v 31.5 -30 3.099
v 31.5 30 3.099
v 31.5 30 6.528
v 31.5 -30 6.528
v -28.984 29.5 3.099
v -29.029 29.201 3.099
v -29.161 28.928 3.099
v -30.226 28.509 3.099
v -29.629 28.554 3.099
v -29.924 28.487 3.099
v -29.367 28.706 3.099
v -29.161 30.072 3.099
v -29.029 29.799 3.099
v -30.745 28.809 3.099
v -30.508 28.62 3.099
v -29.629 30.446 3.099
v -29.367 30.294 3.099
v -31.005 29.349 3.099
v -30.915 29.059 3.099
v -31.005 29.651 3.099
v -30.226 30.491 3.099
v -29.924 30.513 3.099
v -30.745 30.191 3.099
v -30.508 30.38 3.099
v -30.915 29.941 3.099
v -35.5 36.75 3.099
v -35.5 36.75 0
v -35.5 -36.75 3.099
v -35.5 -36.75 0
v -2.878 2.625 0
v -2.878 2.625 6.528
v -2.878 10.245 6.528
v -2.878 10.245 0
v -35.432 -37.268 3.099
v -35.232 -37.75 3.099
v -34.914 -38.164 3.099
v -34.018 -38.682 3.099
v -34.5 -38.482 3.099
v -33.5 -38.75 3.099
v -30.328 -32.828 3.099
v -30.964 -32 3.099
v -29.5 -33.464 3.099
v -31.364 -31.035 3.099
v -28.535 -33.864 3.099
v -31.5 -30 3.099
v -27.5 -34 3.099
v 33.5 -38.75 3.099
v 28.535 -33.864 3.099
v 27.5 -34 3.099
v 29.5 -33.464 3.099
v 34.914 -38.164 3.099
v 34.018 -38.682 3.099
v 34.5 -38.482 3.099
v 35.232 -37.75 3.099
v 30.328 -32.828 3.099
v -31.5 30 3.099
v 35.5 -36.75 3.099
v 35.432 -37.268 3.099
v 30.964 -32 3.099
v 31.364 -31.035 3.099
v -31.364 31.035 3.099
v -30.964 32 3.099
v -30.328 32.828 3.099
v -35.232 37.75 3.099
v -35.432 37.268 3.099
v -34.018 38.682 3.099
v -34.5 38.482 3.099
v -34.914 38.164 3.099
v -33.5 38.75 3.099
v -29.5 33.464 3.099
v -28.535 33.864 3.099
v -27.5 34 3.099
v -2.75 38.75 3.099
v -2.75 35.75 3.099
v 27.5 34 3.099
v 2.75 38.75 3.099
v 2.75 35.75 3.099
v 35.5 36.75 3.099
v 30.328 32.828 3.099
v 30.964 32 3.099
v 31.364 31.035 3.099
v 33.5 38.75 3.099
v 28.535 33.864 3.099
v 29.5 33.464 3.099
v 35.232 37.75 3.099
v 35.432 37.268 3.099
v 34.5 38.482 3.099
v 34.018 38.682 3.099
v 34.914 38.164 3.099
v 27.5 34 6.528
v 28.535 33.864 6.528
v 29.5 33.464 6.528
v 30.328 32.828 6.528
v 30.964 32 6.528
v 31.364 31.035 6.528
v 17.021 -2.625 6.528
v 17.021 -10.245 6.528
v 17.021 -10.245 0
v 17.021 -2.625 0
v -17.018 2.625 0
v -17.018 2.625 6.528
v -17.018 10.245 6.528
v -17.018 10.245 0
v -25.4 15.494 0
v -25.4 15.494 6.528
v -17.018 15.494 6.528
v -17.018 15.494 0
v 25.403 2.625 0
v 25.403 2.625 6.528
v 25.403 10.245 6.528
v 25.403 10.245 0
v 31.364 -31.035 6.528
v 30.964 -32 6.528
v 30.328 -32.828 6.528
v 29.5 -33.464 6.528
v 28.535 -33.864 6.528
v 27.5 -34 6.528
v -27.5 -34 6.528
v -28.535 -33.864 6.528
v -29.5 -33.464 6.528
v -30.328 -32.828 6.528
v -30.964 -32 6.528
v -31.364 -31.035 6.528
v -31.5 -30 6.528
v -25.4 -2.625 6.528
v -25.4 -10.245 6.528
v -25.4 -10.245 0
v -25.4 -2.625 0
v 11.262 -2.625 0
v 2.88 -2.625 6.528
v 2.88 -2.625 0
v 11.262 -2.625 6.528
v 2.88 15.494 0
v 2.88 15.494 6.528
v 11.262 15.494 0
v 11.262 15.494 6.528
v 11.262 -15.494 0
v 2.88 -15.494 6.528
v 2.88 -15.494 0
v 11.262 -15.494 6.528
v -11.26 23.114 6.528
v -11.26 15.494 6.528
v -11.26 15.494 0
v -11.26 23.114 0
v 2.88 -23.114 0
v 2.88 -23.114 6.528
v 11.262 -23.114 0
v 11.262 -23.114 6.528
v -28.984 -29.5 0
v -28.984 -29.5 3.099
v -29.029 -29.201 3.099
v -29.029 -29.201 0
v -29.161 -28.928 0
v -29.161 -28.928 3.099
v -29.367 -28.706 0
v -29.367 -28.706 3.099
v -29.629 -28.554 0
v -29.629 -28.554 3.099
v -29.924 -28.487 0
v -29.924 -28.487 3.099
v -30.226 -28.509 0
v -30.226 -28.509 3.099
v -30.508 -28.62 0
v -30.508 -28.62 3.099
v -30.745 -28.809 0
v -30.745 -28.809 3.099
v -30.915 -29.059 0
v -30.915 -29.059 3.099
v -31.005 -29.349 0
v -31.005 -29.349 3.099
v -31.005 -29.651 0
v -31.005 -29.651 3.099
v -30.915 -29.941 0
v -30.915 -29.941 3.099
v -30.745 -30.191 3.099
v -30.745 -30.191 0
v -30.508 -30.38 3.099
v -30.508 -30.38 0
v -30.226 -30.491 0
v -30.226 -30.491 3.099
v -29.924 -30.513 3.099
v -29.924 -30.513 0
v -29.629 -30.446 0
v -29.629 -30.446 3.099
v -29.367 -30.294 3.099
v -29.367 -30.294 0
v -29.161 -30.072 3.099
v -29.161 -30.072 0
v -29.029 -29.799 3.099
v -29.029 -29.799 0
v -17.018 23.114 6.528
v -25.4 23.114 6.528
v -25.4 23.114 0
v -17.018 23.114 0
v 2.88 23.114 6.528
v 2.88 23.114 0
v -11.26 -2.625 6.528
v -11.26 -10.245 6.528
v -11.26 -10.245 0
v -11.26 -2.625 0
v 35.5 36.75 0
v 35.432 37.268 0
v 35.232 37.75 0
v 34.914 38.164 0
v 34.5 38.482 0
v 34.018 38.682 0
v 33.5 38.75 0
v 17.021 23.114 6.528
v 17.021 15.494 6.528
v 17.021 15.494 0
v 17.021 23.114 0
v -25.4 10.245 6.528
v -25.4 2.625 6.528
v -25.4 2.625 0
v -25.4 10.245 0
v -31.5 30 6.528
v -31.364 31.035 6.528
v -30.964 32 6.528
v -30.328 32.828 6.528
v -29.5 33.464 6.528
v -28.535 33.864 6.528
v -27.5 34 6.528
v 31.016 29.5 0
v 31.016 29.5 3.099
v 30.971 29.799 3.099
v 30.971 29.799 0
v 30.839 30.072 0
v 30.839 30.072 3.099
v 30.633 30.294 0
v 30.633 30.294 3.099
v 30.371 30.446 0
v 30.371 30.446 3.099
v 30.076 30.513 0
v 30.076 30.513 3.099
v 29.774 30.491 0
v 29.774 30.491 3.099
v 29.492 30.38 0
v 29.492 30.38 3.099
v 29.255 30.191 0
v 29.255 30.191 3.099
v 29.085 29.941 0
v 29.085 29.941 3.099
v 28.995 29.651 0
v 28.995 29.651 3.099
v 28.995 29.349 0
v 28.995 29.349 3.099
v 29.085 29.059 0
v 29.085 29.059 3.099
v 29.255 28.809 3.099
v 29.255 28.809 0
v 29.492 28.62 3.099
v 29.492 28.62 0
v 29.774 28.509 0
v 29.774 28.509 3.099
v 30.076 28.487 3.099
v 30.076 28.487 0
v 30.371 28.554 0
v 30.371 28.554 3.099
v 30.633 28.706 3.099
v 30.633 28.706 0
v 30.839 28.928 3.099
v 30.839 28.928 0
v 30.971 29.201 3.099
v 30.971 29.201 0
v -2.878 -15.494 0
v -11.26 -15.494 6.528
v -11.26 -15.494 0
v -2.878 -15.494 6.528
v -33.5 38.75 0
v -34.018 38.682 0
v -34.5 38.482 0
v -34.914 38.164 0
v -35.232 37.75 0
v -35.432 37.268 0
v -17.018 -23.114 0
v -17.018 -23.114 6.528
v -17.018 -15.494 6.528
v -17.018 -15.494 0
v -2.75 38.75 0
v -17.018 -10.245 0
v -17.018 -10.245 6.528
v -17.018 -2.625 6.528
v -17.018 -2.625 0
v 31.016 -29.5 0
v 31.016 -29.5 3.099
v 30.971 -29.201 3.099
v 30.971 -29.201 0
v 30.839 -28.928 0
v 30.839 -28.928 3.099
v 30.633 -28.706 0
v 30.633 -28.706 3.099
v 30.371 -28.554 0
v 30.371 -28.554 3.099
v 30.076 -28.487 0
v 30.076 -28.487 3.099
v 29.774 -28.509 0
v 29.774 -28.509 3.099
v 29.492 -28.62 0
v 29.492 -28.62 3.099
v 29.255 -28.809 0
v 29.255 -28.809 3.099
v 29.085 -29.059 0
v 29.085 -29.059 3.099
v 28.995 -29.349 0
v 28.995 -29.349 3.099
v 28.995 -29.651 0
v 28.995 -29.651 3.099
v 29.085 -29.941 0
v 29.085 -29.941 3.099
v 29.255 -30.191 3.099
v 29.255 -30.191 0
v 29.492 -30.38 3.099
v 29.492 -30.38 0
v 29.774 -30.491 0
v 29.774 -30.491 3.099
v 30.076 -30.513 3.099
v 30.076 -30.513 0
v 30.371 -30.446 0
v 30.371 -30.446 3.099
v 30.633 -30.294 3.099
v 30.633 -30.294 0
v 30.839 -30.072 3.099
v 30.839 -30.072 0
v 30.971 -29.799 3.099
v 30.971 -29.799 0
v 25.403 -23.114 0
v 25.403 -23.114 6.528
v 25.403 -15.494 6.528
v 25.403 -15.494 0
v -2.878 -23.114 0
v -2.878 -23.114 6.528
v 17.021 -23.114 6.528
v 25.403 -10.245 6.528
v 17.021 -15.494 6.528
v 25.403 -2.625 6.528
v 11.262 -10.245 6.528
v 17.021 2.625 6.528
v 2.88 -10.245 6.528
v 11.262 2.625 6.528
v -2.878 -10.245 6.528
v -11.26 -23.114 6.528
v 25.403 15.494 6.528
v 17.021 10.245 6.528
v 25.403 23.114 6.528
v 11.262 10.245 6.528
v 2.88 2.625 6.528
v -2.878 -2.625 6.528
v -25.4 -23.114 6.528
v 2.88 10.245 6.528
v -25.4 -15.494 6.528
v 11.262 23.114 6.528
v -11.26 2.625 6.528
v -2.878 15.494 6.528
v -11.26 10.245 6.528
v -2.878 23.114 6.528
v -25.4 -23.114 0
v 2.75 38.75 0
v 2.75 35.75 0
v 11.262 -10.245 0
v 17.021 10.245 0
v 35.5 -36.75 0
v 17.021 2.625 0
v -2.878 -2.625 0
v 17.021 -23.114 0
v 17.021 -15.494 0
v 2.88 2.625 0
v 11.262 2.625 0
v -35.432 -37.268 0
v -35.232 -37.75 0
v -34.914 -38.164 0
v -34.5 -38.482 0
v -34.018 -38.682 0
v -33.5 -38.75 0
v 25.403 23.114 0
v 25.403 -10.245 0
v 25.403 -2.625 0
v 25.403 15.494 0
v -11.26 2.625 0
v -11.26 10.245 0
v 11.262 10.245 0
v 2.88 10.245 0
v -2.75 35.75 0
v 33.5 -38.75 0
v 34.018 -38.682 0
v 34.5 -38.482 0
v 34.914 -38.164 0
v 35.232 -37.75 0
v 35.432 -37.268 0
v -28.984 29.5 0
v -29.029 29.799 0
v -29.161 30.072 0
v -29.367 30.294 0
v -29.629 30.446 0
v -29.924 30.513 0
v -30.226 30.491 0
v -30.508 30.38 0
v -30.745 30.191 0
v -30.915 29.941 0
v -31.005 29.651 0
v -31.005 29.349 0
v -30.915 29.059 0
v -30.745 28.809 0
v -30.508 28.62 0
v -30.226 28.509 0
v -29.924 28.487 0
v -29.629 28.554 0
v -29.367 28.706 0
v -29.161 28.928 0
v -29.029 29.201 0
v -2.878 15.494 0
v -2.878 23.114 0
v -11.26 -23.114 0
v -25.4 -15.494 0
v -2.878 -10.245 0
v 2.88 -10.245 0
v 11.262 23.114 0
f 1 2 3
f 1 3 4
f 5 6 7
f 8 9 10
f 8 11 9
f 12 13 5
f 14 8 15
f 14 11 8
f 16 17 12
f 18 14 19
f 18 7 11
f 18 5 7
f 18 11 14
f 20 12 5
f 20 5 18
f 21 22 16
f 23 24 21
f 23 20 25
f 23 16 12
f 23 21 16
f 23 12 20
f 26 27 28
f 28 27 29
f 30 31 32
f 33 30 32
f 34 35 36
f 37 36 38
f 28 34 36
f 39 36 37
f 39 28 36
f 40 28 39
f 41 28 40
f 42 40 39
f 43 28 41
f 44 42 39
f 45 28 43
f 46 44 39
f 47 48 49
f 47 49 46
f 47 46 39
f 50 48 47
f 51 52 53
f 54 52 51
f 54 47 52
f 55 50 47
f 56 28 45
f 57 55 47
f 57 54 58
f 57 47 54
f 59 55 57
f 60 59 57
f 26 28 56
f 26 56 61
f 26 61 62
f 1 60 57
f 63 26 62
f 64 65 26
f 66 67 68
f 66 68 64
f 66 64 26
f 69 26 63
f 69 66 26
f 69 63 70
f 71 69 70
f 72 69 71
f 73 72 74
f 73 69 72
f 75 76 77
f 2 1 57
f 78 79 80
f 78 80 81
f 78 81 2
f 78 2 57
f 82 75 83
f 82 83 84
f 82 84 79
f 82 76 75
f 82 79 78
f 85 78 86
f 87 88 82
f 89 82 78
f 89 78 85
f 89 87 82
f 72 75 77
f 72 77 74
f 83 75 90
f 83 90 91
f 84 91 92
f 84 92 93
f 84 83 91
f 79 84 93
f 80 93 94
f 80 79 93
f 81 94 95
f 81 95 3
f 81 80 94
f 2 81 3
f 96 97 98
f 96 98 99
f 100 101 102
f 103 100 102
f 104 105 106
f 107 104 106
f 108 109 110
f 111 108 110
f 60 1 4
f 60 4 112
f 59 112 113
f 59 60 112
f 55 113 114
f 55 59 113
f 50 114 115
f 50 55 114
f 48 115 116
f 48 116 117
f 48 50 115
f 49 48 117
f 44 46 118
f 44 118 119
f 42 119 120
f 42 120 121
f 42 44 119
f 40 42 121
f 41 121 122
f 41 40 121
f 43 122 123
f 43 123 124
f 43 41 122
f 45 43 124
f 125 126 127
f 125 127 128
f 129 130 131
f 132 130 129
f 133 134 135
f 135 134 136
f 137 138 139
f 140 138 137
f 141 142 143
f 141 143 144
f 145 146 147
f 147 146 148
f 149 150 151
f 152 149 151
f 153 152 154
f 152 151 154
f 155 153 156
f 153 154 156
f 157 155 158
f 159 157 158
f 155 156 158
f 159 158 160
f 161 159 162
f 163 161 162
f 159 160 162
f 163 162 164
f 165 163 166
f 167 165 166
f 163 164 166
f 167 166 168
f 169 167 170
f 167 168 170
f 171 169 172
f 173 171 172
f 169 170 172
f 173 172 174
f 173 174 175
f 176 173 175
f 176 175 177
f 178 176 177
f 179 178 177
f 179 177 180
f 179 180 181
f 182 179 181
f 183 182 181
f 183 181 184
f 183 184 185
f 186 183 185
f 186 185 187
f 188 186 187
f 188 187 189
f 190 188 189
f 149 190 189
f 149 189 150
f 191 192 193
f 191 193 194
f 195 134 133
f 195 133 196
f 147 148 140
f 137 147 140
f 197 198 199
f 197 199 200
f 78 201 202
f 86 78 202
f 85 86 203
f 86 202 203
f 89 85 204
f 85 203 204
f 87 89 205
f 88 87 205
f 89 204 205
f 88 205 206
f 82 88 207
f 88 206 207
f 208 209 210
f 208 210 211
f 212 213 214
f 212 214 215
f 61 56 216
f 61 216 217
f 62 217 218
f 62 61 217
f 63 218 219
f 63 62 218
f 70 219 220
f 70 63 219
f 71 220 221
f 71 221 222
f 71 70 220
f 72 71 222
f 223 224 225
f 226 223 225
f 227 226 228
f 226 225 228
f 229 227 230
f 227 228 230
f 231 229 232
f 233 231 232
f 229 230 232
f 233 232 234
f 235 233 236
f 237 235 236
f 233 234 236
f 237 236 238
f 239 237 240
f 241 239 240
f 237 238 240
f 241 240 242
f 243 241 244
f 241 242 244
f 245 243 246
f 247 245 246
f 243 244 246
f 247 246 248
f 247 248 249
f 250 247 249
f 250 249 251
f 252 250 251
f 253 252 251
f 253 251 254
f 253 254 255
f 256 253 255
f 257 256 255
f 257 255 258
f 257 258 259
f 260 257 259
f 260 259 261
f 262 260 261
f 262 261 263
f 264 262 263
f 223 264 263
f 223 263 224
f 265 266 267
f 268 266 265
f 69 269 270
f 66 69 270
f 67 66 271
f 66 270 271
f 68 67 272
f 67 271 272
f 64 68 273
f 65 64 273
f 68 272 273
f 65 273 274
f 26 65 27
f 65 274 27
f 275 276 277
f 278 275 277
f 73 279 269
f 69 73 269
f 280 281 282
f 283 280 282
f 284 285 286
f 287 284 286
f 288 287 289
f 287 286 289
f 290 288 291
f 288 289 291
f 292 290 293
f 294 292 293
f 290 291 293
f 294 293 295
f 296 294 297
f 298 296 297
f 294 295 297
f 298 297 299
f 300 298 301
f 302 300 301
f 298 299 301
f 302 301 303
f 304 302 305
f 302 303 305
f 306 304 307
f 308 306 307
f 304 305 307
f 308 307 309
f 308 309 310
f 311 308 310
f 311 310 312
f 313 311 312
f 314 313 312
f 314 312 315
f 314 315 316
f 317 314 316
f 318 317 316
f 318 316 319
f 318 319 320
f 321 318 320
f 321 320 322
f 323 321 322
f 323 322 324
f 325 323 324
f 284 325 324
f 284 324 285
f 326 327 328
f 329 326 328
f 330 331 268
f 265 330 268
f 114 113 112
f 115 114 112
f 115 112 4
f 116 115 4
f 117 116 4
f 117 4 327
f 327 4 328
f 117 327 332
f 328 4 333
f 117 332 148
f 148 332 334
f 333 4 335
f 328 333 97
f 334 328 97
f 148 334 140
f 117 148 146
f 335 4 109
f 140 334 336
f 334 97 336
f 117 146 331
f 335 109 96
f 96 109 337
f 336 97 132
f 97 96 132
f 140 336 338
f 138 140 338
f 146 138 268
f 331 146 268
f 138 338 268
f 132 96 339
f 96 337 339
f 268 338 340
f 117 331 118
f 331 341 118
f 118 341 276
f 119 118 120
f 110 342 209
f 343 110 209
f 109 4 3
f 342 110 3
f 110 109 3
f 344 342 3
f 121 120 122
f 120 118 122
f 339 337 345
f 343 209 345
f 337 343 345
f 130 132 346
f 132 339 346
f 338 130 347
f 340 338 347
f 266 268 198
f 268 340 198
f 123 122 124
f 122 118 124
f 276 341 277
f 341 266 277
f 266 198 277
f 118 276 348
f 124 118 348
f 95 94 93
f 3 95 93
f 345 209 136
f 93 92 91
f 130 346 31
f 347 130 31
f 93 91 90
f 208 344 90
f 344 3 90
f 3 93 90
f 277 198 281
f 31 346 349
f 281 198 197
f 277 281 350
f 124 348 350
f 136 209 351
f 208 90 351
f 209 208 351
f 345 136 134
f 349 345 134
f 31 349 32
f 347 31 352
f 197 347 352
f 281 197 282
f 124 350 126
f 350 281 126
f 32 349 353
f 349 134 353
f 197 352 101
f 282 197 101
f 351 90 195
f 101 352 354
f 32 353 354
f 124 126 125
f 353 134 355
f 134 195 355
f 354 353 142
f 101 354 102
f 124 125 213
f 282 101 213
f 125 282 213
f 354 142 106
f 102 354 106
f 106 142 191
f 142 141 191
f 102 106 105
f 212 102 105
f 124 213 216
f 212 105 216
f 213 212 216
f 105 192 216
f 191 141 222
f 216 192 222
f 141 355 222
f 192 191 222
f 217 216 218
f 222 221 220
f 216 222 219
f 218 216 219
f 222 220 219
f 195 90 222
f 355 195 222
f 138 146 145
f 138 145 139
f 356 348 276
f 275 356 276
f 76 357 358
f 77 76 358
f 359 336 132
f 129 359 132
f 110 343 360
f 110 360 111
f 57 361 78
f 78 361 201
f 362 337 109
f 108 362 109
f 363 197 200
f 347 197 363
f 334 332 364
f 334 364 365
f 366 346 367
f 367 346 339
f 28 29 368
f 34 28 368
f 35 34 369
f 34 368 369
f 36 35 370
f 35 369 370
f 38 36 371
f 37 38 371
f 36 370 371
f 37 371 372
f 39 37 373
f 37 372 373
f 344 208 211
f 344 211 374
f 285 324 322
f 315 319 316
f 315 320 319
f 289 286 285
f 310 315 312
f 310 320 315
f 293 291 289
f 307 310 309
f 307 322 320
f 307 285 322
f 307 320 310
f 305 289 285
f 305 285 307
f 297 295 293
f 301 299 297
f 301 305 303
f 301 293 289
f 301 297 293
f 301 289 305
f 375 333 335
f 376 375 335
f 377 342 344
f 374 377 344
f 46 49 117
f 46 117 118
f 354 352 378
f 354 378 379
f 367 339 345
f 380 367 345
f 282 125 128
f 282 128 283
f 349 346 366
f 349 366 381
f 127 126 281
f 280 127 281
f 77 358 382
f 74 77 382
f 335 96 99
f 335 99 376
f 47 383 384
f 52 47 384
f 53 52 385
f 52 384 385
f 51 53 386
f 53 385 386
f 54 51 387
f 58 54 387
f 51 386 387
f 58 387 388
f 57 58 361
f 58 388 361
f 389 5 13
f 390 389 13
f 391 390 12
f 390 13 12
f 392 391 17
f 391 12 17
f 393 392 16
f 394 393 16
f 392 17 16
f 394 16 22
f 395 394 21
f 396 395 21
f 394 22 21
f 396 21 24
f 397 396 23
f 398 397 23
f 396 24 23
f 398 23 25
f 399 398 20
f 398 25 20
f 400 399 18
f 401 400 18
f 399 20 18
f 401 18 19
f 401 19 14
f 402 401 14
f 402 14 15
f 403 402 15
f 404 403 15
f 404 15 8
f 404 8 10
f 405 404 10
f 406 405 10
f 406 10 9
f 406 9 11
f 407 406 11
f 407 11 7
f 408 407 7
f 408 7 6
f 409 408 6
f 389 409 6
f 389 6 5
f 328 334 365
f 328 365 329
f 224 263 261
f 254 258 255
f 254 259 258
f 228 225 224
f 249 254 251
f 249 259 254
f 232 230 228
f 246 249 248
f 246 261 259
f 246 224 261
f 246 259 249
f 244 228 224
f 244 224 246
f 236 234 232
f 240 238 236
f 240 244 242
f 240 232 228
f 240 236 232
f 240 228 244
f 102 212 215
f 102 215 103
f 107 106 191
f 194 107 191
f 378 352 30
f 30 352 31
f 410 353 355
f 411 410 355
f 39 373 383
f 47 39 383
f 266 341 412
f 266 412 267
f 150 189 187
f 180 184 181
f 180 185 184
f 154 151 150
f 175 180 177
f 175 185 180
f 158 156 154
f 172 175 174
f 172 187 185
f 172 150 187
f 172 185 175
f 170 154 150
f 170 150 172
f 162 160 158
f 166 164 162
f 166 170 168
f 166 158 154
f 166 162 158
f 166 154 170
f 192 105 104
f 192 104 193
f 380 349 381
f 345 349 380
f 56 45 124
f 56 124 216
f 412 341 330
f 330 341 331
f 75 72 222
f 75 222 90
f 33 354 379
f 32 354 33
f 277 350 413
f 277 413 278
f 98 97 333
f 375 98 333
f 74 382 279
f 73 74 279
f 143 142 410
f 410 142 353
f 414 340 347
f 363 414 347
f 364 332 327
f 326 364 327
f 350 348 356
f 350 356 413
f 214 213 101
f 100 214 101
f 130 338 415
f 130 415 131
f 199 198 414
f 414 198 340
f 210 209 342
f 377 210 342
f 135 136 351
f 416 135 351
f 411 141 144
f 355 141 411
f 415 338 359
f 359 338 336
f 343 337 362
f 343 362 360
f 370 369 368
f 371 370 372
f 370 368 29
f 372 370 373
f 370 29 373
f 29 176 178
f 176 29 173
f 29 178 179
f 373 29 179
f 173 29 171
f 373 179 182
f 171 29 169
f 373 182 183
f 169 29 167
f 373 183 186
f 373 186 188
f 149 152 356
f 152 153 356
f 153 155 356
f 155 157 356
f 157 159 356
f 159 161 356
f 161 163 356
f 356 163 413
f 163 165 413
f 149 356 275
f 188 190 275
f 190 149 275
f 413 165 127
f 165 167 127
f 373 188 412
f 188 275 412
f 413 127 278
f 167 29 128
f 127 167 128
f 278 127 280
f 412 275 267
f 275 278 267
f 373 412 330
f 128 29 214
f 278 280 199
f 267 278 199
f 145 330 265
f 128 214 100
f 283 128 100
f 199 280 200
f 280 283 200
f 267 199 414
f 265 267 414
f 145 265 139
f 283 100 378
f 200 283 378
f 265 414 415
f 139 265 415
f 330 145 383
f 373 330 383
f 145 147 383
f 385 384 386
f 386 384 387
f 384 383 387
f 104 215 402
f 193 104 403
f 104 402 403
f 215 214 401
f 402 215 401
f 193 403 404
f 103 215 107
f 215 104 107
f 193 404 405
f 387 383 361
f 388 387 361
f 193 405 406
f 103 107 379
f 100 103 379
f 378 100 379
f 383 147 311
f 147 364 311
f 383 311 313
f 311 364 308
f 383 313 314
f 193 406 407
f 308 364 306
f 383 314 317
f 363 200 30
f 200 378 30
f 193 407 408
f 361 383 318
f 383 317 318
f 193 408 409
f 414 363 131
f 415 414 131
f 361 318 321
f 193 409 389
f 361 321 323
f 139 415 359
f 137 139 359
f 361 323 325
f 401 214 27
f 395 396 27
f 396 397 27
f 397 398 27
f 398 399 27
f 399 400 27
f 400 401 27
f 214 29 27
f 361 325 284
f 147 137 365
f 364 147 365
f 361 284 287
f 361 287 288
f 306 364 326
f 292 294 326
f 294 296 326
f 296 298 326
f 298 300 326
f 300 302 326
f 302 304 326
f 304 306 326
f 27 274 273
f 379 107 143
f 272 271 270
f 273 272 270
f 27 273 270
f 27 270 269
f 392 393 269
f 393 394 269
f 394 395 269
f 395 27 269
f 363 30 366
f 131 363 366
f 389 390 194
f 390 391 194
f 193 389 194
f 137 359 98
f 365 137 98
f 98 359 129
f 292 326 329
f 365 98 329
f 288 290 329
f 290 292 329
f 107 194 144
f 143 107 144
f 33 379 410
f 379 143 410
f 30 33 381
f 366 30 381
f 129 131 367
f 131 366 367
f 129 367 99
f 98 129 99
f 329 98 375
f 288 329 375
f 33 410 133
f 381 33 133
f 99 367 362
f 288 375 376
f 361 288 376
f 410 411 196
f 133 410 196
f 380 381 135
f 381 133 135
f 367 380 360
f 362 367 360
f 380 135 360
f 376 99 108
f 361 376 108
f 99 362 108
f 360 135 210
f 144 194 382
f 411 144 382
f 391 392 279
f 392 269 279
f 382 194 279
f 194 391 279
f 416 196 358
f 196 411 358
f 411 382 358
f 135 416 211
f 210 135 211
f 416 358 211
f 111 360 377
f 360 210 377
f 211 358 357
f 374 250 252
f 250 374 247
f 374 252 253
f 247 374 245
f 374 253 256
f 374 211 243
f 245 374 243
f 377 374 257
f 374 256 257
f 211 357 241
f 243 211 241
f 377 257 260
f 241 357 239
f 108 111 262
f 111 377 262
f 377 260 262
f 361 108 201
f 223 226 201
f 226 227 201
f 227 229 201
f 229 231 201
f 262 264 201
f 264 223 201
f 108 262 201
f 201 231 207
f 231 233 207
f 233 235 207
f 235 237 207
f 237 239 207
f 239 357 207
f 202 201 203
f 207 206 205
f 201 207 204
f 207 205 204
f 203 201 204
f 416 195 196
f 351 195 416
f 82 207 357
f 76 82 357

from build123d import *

# Parameters (mm, degrees)
BASE_DEPTH        = 3.0988
SKETCH4_R         = 1.016
MOUNT_HOLES_DEPTH = 4.0988
EXTRUDE2_DEPTH    = 3.429
SKETCH3_W         = 8.382
SKETCH3_H         = 7.62
KEY_DEPTH         = 7.5278
KEYS_COUNT        = 4
KEYS_PITCH        = 14.14018
KEYS_COUNT_DIR2   = 4
KEYS_PITCH_DIR2   = 12.869418


with BuildPart() as part:
    # Sketch1 → base (new body)
    with BuildSketch(Plane.XY):
        with BuildLine():
            Line((-2.75, 38.75), (-33.5, 38.75))
            ThreePointArc((-33.5, 38.75), (-34.914213562, 38.164213562), (-35.5, 36.75))
            Line((-35.5, 36.75), (-35.5, -36.75))
            ThreePointArc((-35.5, -36.75), (-34.914213562, -38.164213562), (-33.5, -38.75))
            Line((-33.5, -38.75), (33.5, -38.75))
            ThreePointArc((33.5, -38.75), (34.914213562, -38.164213562), (35.5, -36.75))
            Line((35.5, -36.75), (35.5, 36.75))
            ThreePointArc((35.5, 36.75), (34.914213562, 38.164213562), (33.5, 38.75))
            Line((33.5, 38.75), (2.75, 38.75))
            Line((2.75, 38.75), (2.75, 35.75))
            Line((2.75, 35.75), (-2.75, 35.75))
            Line((-2.75, 35.75), (-2.75, 38.75))
        make_face()
    extrude(amount=BASE_DEPTH)

    # Sketch4 → mount holes (cut, through all)
    with BuildSketch(Plane.XY.offset(3.0988)):
        with Locations((-30, 29.5)):
            Circle(SKETCH4_R)
        with Locations((30, 29.5)):
            Circle(SKETCH4_R)
        with Locations((30, -29.5)):
            Circle(SKETCH4_R)
        with Locations((-30, -29.5)):
            Circle(SKETCH4_R)
    extrude(amount=-MOUNT_HOLES_DEPTH, mode=Mode.SUBTRACT)

    # Sketch2 → Extrude2 (add)
    with BuildSketch(Plane.XY.offset(3.0988)):
        with BuildLine():
            Line((-27.5, 34), (27.5, 34))
            ThreePointArc((27.5, 34), (30.328427125, 32.828427125), (31.5, 30))
            Line((31.5, 30), (31.5, -30))
            ThreePointArc((31.5, -30), (30.328427125, -32.828427125), (27.5, -34))
            Line((27.5, -34), (-27.5, -34))
            ThreePointArc((-27.5, -34), (-30.328427125, -32.828427125), (-31.5, -30))
            Line((-31.5, -30), (-31.5, 30))
            ThreePointArc((-31.5, 30), (-30.328427125, 32.828427125), (-27.5, 34))
        make_face()
    extrude(amount=EXTRUDE2_DEPTH)

    # Sketch3 → key (cut, through all)
    with BuildSketch(Plane.XY.offset(6.5278)):
        with Locations((-21.209, 19.304)):
            Rectangle(SKETCH3_W, SKETCH3_H)
    key = extrude(amount=-KEY_DEPTH, mode=Mode.SUBTRACT)

    # keys: key 4 × 4
    with Locations(*[(i * KEYS_PITCH, -j * KEYS_PITCH_DIR2, 0) for i in range(KEYS_COUNT) for j in range(KEYS_COUNT_DIR2) if (i, j) != (0, 0)]):
        add(key, mode=Mode.SUBTRACT)


solid = part.part
